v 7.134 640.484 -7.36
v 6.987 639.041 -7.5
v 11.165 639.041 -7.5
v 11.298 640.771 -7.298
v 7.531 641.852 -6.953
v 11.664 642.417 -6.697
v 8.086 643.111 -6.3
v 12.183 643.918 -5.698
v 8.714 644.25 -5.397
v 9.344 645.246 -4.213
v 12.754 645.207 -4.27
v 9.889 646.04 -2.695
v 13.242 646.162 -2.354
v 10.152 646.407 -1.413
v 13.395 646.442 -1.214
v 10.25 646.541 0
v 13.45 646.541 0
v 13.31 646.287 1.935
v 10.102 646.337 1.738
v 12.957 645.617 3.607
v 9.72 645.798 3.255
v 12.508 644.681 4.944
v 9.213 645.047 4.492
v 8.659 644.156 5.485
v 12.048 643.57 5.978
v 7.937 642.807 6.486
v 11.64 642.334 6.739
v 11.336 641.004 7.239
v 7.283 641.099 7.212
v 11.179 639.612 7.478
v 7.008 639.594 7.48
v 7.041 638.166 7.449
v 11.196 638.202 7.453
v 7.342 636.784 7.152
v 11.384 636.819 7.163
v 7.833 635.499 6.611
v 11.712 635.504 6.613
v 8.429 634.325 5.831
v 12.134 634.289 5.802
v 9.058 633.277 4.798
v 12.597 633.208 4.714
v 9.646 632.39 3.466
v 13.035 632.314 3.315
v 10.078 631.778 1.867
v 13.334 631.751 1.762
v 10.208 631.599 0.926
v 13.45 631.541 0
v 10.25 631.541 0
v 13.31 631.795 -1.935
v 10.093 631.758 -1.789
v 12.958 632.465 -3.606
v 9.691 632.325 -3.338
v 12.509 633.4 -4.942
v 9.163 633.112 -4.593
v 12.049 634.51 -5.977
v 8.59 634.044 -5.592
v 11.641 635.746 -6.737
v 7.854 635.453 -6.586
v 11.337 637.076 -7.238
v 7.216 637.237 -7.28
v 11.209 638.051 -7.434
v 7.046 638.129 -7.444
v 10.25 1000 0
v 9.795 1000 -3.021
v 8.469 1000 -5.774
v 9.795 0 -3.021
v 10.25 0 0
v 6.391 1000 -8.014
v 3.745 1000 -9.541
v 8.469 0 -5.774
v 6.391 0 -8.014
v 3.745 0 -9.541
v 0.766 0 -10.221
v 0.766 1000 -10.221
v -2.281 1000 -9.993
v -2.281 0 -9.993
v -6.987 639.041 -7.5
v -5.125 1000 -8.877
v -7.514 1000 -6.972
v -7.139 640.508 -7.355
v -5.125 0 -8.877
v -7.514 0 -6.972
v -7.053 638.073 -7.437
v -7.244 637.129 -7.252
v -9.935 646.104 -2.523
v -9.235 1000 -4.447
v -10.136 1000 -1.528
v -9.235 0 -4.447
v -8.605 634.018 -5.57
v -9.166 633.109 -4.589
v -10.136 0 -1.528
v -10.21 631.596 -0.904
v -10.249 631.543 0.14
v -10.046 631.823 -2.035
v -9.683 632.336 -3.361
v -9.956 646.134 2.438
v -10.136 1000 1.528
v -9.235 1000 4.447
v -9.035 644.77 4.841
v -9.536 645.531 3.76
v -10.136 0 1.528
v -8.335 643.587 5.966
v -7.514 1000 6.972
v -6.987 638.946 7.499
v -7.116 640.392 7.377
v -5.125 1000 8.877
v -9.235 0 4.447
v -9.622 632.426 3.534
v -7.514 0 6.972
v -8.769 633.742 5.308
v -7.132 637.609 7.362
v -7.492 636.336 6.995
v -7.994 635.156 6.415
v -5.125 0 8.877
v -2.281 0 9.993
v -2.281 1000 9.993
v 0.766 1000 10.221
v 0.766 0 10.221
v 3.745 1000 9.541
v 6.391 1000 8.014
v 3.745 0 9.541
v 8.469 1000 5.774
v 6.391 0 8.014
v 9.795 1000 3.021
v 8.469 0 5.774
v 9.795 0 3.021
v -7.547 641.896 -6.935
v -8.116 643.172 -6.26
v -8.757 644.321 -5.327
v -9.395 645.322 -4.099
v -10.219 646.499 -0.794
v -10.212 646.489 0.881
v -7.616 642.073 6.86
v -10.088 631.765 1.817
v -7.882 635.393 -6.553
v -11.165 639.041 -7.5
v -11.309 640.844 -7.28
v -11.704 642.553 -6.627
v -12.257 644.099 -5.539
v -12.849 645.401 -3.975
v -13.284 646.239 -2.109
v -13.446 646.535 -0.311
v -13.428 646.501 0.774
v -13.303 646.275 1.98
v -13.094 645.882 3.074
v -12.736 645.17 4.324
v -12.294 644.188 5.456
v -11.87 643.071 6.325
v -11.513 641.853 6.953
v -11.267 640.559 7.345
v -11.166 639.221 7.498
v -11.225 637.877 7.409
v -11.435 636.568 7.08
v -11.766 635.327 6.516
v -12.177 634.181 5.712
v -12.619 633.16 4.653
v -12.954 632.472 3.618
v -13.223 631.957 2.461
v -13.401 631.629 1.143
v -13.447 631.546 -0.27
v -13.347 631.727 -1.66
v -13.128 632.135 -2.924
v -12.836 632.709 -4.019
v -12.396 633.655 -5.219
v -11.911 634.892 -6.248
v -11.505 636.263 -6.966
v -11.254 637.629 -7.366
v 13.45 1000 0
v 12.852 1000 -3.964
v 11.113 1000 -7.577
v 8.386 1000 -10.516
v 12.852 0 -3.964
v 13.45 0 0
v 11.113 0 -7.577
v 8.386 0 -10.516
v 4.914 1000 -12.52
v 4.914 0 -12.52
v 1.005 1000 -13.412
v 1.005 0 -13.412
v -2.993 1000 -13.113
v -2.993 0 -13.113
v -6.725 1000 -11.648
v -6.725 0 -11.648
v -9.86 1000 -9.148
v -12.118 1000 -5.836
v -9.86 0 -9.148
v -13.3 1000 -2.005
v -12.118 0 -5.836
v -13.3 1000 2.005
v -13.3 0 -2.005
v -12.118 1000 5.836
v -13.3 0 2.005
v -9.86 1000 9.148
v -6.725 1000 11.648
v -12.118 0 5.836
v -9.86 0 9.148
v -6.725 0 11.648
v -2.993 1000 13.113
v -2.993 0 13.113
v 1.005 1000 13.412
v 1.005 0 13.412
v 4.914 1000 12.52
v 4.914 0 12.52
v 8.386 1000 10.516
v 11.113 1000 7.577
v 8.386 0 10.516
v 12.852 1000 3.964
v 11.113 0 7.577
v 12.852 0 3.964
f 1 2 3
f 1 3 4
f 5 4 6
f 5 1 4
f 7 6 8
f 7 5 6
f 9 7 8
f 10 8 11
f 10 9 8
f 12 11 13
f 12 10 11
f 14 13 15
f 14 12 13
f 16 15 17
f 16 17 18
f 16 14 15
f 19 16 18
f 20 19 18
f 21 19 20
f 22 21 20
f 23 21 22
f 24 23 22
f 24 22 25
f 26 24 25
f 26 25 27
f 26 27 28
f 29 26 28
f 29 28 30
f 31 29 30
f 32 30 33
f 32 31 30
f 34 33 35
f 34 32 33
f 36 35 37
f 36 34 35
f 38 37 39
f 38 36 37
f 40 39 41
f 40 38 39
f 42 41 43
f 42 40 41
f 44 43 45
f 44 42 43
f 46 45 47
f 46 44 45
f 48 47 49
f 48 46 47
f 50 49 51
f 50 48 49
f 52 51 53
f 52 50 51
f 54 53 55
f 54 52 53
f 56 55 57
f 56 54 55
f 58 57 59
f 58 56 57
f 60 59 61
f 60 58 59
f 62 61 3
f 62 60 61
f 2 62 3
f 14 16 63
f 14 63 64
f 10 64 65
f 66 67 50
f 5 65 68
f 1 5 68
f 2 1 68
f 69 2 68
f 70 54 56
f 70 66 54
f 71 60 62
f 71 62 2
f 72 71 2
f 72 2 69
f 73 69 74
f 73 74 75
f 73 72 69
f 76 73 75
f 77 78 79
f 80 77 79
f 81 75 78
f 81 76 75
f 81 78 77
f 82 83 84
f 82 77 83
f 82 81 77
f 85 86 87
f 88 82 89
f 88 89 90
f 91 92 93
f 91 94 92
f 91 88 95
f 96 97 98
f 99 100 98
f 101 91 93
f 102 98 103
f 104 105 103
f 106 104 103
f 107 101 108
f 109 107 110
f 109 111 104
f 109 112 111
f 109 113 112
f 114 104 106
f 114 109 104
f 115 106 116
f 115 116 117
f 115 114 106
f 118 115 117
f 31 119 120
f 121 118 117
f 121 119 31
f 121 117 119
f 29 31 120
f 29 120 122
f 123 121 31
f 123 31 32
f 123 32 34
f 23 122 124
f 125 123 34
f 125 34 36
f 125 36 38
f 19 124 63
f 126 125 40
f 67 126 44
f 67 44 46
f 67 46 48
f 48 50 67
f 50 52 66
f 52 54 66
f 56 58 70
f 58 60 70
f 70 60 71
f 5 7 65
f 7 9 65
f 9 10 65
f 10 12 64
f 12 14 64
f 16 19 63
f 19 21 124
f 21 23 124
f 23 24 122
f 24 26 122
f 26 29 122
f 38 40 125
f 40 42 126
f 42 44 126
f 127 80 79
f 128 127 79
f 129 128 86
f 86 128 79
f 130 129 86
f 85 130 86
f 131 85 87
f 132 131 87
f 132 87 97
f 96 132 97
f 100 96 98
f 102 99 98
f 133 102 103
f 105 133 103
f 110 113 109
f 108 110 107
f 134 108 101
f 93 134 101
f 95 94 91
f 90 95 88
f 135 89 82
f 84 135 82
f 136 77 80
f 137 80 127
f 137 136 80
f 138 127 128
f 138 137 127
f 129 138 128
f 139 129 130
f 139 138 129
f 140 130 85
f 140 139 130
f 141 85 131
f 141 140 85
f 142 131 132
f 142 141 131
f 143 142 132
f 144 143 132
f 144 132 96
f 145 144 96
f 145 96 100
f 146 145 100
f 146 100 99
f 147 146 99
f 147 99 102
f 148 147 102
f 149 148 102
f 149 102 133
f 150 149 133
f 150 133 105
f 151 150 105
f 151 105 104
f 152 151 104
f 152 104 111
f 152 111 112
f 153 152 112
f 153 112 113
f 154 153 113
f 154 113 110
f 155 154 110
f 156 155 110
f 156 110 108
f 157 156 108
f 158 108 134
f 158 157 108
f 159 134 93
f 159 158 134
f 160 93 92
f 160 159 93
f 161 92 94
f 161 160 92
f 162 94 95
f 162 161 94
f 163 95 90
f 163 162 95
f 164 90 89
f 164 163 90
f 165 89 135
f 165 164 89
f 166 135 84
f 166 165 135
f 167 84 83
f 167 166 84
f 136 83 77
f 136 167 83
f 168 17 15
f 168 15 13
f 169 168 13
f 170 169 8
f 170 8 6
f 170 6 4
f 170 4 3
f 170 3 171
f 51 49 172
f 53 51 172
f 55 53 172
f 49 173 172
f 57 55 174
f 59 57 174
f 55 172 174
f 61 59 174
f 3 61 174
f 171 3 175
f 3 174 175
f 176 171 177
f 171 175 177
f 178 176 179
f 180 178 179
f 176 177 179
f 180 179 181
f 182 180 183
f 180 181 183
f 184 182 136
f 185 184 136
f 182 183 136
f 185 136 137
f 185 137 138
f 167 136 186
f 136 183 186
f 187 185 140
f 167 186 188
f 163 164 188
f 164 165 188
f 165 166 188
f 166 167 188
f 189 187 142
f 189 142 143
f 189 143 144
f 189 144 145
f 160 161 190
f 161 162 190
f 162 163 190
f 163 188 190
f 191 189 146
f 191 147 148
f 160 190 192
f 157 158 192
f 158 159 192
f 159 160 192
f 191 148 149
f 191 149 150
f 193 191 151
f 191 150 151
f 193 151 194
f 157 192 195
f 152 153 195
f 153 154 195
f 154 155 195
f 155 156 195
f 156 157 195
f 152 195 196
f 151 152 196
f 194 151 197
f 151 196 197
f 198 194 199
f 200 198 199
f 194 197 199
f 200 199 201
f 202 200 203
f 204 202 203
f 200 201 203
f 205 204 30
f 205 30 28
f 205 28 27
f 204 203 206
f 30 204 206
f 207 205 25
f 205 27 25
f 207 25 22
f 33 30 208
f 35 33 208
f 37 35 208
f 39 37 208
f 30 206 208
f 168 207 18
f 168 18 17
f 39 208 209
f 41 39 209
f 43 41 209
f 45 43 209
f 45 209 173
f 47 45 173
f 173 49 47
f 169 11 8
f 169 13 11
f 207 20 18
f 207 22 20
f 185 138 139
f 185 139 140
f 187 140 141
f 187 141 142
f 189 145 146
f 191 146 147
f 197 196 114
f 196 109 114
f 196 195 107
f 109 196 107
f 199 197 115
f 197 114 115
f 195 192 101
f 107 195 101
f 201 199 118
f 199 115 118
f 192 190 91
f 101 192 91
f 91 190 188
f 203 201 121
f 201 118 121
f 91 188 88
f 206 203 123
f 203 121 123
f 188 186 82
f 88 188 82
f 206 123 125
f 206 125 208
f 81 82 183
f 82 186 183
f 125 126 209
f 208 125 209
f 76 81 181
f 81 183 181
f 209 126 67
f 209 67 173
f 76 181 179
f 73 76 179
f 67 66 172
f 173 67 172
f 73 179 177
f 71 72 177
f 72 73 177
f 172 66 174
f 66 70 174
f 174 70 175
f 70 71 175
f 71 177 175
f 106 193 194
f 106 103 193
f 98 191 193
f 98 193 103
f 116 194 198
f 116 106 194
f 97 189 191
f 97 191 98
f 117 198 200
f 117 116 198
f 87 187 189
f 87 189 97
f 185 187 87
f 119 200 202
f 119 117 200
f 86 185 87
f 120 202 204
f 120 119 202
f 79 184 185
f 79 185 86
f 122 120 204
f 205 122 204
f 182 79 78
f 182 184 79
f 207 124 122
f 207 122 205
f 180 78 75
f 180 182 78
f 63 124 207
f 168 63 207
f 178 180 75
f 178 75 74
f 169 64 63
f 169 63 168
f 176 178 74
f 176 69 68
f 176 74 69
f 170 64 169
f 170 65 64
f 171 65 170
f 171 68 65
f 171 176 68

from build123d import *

# Parameters (mm, degrees)
STRUCTURE_SYSTEM1_OUTLINE_R   = 13.45
STRUCTURE_SYSTEM1_OUTLINE_R_2 = 10.25
STRUCTURE_SYSTEM1_DEPTH       = 1000
CUT_EXTRUDE1_DEPTH            = 1001.18088614
CUT_EXTRUDE1_DEPTH_BACK       = 1001.18088614
SKETCH12_R                    = 7.5


# Read off the part's stored shape, not the designer's step: Structure System1
with BuildPart() as part:
    # Structure System1 outline → Structure System1 (new body)
    with BuildSketch(Plane(origin=(0, 0, 0), x_dir=(1, 0, 0), z_dir=(0, 1, 0))):
        Circle(STRUCTURE_SYSTEM1_OUTLINE_R)
        Circle(STRUCTURE_SYSTEM1_OUTLINE_R_2, mode=Mode.SUBTRACT)
    extrude(amount=STRUCTURE_SYSTEM1_DEPTH)

    # Sketch12 → Cut-Extrude1 (cut, two sides: drawn at the far end of the back side and taken through both)
    with BuildSketch(Plane(origin=(0, 0, 0), x_dir=(0, 0, -1), z_dir=(1, 0, 0)).offset(-CUT_EXTRUDE1_DEPTH_BACK)):
        with Locations((0, 639.041378949)):
            Circle(SKETCH12_R)
    extrude(amount=CUT_EXTRUDE1_DEPTH + CUT_EXTRUDE1_DEPTH_BACK, mode=Mode.SUBTRACT)


solid = part.part
